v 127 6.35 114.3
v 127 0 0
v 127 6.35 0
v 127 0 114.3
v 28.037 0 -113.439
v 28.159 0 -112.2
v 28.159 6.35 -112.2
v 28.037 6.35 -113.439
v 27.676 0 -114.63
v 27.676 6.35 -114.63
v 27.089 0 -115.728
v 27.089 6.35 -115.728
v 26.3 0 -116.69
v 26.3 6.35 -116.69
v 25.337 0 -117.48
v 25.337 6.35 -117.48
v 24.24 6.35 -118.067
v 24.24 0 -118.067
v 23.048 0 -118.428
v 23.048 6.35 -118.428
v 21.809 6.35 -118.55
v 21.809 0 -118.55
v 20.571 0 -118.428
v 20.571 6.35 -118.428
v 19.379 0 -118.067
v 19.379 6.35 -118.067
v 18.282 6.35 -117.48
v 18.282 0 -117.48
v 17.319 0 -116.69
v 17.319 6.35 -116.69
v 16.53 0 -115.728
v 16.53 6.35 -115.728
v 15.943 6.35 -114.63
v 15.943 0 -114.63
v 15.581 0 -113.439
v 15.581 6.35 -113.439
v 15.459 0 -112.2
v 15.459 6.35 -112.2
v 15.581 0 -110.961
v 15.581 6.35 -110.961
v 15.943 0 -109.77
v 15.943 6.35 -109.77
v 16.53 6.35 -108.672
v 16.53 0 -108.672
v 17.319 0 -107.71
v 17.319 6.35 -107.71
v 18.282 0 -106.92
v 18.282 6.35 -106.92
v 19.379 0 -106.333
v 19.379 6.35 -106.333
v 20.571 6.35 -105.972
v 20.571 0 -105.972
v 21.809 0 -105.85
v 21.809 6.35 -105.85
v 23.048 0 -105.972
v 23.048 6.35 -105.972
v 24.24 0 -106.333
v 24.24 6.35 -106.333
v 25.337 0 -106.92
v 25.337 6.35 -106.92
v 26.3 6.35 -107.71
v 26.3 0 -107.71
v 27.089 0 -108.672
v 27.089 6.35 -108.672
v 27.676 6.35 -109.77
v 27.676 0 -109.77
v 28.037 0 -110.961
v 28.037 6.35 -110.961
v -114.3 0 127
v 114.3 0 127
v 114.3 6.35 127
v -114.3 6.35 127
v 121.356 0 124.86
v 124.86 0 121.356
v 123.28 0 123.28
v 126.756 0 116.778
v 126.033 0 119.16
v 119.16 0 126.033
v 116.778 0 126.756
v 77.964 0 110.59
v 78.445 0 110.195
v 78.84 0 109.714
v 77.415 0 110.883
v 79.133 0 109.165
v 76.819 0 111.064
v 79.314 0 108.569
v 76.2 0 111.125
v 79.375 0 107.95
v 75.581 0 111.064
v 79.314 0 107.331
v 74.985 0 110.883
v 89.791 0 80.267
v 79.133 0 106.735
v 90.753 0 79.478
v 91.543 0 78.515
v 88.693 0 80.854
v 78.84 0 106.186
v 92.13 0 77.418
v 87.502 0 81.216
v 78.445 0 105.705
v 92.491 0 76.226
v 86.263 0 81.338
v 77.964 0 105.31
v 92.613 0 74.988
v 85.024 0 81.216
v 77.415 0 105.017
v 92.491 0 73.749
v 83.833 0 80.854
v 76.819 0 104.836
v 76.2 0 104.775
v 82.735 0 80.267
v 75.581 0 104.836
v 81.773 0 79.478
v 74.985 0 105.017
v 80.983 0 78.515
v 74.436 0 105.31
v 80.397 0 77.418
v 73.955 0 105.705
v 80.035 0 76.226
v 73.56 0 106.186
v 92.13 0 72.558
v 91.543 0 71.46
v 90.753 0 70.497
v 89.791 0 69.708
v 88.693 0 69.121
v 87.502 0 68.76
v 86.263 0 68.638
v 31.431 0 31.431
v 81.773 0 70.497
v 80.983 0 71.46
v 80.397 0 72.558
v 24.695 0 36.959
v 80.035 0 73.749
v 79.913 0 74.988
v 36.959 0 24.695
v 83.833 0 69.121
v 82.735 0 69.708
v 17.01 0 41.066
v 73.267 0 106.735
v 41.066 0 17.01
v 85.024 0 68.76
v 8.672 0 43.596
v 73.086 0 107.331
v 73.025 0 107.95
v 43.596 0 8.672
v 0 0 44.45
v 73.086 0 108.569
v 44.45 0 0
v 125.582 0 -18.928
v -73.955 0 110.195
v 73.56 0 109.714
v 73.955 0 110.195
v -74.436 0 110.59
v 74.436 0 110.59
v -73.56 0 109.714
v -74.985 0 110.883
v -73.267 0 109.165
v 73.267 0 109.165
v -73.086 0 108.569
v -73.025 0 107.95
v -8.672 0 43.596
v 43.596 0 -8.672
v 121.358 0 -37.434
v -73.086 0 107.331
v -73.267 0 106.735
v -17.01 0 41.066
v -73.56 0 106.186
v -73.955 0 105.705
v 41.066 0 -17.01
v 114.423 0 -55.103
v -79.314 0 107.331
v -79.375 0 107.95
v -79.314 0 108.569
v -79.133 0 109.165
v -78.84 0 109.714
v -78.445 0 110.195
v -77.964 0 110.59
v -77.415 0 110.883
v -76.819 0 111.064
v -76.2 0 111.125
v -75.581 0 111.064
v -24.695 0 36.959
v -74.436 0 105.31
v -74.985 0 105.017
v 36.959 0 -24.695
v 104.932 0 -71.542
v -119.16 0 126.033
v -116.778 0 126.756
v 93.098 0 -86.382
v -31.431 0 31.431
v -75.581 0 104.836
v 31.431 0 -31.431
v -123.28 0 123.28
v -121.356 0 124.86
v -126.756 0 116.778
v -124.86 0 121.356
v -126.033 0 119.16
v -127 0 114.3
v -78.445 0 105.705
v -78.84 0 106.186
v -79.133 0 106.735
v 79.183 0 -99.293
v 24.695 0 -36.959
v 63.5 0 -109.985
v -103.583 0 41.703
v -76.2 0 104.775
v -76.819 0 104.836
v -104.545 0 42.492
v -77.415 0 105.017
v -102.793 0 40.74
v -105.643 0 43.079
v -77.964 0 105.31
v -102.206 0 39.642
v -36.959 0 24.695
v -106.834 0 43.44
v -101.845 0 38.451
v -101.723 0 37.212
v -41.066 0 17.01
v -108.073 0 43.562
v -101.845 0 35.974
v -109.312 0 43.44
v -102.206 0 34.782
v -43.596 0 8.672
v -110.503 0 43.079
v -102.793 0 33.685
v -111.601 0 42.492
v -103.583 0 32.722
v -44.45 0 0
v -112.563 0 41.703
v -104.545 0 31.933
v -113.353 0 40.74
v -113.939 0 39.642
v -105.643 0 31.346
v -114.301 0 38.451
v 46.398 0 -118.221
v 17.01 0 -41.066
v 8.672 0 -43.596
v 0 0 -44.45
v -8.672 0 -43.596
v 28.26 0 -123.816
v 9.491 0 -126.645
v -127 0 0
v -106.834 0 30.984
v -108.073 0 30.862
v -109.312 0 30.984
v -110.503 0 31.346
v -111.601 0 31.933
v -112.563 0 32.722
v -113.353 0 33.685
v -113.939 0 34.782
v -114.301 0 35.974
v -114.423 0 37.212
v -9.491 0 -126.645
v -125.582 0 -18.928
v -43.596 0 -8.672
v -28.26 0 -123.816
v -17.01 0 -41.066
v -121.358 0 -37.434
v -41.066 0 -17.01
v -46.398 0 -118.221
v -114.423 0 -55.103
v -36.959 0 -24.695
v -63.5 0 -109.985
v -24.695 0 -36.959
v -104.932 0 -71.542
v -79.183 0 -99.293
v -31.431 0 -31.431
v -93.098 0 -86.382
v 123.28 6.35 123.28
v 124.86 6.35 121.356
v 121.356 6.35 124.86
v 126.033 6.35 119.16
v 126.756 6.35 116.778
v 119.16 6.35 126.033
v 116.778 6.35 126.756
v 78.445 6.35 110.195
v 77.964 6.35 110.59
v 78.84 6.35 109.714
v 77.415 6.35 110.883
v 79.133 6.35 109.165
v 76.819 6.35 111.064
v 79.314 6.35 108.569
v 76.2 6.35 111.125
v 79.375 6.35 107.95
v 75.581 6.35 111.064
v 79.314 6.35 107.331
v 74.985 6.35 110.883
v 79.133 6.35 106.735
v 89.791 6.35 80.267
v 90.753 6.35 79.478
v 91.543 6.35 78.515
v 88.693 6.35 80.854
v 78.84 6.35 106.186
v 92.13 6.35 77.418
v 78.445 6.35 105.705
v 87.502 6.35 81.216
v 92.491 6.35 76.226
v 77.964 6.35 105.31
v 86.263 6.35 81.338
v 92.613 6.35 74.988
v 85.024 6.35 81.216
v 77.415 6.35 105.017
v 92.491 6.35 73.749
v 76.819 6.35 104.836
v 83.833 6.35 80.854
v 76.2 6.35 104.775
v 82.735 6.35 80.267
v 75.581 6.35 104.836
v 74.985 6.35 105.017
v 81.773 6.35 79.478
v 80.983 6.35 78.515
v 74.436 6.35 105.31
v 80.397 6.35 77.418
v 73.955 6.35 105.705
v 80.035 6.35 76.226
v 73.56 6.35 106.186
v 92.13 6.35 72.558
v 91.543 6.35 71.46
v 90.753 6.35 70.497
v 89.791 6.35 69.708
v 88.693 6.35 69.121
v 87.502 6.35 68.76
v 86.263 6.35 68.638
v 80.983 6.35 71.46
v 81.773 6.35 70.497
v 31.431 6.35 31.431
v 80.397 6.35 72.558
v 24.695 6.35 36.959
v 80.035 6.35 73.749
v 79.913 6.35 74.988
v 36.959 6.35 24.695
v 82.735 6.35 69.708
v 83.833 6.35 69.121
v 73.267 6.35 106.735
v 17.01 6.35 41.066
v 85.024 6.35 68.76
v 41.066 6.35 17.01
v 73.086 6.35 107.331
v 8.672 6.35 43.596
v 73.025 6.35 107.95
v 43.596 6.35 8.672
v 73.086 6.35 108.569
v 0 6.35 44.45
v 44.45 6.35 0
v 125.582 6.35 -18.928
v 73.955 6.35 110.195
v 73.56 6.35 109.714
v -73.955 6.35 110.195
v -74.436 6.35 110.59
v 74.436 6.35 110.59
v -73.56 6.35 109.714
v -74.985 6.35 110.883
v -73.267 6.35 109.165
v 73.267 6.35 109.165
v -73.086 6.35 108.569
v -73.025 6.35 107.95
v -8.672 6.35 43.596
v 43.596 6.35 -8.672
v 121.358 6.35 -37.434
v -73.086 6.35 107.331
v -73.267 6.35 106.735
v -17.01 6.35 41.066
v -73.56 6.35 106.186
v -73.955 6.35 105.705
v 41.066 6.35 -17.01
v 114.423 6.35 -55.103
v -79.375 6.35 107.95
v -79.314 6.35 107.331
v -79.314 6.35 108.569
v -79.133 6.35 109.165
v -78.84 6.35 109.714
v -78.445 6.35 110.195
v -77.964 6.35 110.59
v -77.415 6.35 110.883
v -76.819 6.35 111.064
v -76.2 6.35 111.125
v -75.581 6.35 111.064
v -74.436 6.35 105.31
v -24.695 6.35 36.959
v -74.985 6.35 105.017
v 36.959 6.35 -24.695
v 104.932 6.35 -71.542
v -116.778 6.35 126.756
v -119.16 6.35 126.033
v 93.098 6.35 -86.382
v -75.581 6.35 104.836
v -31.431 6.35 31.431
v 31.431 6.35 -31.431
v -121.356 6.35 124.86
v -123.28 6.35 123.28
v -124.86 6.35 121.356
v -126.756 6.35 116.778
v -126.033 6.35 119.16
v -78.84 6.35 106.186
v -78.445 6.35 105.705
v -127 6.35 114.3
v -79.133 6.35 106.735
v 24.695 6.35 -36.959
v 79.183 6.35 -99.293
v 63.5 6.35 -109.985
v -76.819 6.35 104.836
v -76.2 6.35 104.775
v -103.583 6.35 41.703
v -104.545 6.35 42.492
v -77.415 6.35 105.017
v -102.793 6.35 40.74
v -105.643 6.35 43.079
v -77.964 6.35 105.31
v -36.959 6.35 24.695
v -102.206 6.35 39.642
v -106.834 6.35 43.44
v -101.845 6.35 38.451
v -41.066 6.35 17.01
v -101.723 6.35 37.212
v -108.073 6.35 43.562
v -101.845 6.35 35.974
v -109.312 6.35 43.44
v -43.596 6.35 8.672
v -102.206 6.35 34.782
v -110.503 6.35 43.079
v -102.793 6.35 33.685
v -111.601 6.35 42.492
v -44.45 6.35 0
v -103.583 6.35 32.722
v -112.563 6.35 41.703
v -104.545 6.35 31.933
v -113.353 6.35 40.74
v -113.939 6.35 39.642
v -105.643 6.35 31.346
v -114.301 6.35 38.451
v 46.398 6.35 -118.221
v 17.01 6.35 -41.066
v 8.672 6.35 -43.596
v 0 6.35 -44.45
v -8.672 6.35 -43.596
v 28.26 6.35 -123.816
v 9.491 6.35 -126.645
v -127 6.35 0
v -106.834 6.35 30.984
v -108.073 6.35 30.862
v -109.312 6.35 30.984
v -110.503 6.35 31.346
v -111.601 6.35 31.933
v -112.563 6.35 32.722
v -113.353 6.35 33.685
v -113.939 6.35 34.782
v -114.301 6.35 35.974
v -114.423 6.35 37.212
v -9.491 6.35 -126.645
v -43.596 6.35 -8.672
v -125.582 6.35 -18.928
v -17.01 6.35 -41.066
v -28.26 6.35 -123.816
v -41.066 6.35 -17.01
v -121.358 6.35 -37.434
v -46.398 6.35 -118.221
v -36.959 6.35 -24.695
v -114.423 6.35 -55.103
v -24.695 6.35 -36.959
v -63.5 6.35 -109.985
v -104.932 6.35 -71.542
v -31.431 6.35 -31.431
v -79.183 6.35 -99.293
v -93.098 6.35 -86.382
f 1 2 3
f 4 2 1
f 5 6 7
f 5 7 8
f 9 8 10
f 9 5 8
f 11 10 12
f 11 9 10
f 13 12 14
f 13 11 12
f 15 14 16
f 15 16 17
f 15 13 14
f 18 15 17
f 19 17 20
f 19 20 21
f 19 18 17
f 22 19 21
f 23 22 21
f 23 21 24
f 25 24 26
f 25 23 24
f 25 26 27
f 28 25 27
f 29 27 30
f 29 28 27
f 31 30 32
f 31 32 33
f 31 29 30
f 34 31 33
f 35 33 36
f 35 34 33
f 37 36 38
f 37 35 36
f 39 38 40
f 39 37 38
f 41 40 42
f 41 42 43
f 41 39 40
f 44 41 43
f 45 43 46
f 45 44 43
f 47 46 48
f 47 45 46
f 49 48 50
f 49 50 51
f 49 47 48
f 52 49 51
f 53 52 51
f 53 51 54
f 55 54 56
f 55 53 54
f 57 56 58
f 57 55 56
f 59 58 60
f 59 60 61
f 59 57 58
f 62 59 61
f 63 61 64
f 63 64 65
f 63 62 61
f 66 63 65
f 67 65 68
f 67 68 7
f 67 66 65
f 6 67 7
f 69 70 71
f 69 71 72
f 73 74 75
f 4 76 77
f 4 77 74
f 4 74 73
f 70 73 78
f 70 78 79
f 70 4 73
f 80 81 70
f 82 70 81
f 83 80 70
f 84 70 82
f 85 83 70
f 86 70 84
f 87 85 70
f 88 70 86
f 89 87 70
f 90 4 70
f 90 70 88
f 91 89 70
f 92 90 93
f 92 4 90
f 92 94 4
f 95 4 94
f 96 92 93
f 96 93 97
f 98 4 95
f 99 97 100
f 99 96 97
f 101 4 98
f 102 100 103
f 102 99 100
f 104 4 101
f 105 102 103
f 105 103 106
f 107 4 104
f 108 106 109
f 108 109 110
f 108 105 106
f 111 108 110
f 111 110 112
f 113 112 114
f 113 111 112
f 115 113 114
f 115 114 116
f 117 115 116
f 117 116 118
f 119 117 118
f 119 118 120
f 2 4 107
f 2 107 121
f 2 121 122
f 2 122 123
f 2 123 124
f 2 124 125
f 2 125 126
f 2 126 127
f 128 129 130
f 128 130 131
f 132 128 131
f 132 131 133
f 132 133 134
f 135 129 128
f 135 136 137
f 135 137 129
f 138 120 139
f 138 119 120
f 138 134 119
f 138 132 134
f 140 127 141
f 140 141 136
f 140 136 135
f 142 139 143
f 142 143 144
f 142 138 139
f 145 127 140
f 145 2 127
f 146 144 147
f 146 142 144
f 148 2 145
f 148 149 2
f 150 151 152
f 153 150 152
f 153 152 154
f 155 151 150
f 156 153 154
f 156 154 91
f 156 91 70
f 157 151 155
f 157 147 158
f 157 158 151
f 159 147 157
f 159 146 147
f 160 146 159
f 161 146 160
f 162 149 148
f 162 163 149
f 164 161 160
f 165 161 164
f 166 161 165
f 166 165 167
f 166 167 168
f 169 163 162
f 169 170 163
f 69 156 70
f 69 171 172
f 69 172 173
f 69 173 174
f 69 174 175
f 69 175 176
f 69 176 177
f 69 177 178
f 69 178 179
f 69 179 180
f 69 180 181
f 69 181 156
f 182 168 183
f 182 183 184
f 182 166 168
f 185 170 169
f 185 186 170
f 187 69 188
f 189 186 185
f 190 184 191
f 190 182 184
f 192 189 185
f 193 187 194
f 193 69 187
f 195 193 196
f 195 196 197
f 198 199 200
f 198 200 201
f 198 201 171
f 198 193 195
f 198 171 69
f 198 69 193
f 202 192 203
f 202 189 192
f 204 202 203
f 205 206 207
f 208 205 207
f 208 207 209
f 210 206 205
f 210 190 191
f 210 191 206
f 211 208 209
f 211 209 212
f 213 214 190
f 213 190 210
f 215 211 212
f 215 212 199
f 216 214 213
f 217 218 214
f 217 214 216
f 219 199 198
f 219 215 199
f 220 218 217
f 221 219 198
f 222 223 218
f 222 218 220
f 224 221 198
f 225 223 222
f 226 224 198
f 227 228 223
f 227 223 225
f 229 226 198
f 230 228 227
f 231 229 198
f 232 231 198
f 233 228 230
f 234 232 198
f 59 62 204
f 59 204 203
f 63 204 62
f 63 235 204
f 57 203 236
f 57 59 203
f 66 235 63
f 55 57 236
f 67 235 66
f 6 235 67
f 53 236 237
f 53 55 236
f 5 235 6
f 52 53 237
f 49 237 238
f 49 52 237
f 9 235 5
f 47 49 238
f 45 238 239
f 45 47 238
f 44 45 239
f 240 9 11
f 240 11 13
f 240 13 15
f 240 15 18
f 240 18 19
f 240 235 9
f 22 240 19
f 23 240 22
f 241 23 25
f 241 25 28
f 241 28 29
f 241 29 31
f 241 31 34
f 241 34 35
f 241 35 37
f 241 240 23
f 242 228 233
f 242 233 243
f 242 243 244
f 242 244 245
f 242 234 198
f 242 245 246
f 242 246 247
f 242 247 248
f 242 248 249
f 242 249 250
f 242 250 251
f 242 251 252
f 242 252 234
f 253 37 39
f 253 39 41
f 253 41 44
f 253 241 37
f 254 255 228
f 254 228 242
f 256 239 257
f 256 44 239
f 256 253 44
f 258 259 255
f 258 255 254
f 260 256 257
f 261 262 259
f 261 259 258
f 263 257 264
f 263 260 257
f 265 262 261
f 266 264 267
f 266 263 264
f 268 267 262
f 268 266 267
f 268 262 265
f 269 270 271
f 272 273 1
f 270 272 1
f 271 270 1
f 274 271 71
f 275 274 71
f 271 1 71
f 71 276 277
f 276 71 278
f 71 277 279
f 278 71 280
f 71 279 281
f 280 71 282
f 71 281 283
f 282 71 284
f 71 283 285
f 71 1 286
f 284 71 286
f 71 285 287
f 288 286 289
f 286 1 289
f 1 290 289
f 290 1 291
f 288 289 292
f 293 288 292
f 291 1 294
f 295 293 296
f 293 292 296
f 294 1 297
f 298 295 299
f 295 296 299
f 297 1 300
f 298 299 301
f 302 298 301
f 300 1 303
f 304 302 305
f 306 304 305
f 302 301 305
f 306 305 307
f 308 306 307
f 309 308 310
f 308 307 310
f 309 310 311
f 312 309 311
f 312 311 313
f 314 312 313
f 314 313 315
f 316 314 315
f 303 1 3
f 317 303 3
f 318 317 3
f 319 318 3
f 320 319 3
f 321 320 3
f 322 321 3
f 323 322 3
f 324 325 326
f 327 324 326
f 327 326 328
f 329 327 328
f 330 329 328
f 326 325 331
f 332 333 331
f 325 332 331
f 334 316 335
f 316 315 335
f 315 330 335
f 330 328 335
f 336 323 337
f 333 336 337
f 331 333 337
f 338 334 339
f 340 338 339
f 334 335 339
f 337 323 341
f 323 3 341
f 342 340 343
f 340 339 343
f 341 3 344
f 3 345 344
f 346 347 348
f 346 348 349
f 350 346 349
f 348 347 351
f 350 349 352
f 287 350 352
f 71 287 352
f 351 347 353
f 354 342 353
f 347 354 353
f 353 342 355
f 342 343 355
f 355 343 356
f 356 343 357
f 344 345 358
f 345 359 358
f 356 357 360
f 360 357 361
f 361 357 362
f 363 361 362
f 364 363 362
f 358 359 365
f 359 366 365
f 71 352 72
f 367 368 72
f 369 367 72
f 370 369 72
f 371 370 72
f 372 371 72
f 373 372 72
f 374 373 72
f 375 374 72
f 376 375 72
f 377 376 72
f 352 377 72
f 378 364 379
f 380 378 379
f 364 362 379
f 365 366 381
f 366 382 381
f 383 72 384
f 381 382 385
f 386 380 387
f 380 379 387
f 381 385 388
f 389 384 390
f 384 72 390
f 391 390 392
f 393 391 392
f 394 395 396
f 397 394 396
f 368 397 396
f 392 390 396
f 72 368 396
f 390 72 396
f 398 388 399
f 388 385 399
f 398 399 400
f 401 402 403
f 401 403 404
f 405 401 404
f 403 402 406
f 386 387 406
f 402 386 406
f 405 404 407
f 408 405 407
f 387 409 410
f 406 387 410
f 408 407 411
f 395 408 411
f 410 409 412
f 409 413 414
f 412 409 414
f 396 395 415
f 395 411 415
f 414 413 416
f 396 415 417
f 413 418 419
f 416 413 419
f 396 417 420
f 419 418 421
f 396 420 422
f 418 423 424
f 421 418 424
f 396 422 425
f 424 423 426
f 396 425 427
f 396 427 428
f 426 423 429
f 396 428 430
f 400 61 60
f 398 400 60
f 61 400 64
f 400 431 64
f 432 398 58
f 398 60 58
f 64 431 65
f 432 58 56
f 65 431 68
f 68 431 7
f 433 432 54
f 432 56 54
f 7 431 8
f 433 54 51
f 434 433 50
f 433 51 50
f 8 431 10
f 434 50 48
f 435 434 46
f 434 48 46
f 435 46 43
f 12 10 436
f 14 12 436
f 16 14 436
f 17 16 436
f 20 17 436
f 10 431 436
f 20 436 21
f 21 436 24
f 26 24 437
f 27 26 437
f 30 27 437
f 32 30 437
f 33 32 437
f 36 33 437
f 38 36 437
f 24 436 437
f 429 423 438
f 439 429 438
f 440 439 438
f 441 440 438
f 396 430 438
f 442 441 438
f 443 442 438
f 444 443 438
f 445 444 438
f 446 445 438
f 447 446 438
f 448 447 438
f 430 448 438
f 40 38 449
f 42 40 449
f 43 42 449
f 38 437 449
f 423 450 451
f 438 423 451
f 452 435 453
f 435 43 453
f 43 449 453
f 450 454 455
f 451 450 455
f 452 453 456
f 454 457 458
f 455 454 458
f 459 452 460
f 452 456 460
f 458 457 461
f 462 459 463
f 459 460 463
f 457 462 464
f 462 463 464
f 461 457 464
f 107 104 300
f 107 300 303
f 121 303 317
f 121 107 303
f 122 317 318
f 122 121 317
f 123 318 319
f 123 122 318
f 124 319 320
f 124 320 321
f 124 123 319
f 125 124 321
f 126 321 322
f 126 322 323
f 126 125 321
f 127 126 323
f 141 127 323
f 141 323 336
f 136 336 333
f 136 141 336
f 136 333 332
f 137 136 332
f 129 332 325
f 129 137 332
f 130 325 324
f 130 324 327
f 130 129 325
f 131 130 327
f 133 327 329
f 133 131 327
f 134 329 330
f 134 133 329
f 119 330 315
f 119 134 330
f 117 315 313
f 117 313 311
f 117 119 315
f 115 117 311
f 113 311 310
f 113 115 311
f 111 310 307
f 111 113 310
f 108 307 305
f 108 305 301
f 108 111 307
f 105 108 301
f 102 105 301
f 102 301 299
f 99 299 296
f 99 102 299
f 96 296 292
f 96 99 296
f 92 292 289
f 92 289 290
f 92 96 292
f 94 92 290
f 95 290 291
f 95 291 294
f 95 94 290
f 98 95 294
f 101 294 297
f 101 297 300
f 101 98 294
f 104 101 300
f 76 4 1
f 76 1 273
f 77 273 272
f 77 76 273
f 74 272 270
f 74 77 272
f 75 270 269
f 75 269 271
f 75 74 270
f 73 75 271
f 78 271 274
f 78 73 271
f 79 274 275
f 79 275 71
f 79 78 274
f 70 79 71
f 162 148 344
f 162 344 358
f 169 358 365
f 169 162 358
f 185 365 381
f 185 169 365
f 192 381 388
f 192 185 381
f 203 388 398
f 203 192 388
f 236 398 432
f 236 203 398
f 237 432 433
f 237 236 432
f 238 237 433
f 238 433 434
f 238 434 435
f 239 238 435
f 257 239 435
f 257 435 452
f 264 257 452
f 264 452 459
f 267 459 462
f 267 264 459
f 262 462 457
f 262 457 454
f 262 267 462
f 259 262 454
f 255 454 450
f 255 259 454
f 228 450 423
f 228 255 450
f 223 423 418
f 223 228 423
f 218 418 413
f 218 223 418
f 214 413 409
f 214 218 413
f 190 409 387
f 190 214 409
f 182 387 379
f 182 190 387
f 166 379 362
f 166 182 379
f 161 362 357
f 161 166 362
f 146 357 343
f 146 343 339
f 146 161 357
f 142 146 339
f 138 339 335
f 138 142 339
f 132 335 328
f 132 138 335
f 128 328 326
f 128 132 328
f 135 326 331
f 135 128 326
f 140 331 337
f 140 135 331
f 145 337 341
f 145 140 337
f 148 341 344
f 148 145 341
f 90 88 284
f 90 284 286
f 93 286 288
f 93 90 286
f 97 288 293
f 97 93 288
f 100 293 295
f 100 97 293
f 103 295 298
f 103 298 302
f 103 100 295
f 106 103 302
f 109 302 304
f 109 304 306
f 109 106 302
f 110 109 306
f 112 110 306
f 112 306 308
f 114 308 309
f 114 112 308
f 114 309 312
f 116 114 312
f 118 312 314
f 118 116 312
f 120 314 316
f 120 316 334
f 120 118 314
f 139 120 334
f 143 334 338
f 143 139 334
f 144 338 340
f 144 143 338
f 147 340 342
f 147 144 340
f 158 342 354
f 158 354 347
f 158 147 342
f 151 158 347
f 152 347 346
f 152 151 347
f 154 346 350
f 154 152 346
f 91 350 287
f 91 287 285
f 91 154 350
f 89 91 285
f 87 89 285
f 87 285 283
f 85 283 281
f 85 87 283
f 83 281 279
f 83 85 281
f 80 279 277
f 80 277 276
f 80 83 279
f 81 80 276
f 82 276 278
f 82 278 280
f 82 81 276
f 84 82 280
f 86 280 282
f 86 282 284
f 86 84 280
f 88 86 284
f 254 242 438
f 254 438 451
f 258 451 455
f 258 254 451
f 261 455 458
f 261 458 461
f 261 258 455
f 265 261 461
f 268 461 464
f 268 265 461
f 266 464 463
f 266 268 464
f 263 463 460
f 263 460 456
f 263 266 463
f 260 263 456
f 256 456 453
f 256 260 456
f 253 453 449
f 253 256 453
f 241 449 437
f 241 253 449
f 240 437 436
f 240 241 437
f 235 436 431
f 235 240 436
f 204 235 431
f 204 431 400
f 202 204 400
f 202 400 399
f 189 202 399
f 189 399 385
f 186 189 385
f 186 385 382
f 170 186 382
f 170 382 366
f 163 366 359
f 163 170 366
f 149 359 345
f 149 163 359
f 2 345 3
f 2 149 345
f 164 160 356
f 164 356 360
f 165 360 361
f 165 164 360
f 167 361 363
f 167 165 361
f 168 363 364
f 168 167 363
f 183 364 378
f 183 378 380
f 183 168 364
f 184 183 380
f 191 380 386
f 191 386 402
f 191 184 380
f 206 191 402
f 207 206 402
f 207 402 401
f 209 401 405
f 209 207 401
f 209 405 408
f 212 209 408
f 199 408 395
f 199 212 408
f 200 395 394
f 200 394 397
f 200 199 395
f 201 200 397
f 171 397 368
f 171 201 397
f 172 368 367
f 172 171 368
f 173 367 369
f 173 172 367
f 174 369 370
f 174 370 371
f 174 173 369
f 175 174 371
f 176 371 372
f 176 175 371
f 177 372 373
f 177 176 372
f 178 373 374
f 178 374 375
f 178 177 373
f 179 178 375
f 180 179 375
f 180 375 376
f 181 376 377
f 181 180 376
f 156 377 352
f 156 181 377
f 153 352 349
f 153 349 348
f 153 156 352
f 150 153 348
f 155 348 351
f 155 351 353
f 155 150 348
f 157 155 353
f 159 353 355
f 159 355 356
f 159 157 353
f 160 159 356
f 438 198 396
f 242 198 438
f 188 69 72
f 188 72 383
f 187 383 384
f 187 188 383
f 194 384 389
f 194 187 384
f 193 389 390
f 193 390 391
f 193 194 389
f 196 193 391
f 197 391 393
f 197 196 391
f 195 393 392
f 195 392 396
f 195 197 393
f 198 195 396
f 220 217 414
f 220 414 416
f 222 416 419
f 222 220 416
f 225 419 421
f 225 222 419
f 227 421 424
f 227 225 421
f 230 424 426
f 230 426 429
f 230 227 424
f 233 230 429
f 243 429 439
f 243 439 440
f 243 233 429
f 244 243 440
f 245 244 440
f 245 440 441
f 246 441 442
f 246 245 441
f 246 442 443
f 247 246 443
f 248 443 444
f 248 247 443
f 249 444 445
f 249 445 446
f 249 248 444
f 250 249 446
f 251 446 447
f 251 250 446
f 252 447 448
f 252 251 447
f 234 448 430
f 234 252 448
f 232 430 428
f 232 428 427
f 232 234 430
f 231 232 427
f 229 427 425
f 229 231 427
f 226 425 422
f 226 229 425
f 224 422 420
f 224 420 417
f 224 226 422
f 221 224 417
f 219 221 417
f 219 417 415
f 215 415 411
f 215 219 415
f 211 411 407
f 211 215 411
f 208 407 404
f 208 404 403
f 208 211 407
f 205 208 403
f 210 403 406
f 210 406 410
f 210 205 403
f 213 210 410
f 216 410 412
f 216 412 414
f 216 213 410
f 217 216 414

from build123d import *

# Parameters (mm, degrees)
SKETCH1_R           = 44.45
SKETCH1_R_2         = 6.35
SKETCH1_R_3         = 3.175
BOSS_EXTRUDE1_DEPTH = 6.35
SKETCH6_R           = 14.2875
SKETCH6_R_2         = 11.176
CUT_EXTRUDE1_DEPTH  = 28.448


with BuildPart() as part:
    # Sketch1 → Boss-Extrude1 (new body)
    with BuildSketch(Plane(origin=(0, 0, 0), x_dir=(1, 0, 0), z_dir=(0, 1, 0))):
        with BuildLine():
            Line((127, 0), (127, -114.3))
            ThreePointArc((127, -114.3), (123.280256121, -123.280256121), (114.3, -127))
            Line((114.3, -127), (-114.3, -127))
            ThreePointArc((-114.3, -127), (-123.280256121, -123.280256121), (-127, -114.3))
            Line((-127, -114.3), (-127, 0))
            ThreePointArc((-127, 0), (0, 127), (127, 0))
        make_face()
        Circle(SKETCH1_R, mode=Mode.SUBTRACT)
        with Locations((-108.072773191, -37.212440054)):
            Circle(SKETCH1_R_2, mode=Mode.SUBTRACT)
        with Locations((21.809468172, 112.199987068)):
            Circle(SKETCH1_R_2, mode=Mode.SUBTRACT)
        with Locations((86.263305019, -74.987547014)):
            Circle(SKETCH1_R_2, mode=Mode.SUBTRACT)
        with Locations((-76.2, -107.95)):
            Circle(SKETCH1_R_3, mode=Mode.SUBTRACT)
        with Locations((76.2, -107.95)):
            Circle(SKETCH1_R_3, mode=Mode.SUBTRACT)
    extrude(amount=BOSS_EXTRUDE1_DEPTH)

    # Sketch6 → Cut-Extrude1 (cut)
    with BuildSketch(Plane(origin=(0, 0, 0), x_dir=(1, 0, 0), z_dir=(0, 1, 0))):
        with Locations((174.752, 0)):
            Circle(SKETCH6_R)
        with Locations((174.752, 0)):
            Circle(SKETCH6_R_2, mode=Mode.SUBTRACT)
    extrude(amount=CUT_EXTRUDE1_DEPTH, mode=Mode.SUBTRACT)


solid = part.part
